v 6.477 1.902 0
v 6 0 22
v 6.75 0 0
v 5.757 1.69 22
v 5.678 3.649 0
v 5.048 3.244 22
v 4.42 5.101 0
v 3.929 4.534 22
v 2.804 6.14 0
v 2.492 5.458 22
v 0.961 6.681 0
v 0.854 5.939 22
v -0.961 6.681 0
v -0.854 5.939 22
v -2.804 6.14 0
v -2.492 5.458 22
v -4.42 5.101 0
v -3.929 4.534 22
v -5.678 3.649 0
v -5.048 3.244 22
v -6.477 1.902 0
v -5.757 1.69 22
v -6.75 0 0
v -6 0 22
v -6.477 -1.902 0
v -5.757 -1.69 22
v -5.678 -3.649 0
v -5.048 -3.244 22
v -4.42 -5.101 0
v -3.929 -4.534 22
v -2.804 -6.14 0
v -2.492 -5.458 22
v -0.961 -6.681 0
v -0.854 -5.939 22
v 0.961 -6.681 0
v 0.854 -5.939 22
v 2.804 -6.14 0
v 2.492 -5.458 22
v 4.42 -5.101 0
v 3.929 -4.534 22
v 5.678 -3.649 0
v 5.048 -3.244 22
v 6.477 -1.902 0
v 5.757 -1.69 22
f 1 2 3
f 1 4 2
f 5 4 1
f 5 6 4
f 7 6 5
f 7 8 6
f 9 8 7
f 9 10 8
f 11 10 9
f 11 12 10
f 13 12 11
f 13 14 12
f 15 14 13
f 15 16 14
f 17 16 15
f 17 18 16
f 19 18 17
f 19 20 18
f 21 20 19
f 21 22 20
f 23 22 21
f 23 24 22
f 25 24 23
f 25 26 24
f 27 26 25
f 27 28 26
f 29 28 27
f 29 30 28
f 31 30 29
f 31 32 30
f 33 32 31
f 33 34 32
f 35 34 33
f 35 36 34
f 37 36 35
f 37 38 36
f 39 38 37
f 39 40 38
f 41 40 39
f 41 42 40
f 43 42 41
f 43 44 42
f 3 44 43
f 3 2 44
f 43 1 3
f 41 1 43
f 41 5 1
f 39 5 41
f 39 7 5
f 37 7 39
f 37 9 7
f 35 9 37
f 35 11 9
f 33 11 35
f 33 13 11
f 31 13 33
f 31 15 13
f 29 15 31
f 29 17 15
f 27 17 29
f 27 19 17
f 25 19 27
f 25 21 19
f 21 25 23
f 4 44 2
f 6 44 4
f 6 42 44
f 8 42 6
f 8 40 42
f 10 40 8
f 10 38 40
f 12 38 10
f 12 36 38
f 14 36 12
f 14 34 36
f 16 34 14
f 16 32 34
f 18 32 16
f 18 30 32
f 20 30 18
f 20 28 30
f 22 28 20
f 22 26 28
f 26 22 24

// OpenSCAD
mainDiameter = 12.5;
constrict = 0.5;
expand = 1;
height = 22;

cylinder(d1=mainDiameter+expand,d2=mainDiameter-constrict,h=height);
